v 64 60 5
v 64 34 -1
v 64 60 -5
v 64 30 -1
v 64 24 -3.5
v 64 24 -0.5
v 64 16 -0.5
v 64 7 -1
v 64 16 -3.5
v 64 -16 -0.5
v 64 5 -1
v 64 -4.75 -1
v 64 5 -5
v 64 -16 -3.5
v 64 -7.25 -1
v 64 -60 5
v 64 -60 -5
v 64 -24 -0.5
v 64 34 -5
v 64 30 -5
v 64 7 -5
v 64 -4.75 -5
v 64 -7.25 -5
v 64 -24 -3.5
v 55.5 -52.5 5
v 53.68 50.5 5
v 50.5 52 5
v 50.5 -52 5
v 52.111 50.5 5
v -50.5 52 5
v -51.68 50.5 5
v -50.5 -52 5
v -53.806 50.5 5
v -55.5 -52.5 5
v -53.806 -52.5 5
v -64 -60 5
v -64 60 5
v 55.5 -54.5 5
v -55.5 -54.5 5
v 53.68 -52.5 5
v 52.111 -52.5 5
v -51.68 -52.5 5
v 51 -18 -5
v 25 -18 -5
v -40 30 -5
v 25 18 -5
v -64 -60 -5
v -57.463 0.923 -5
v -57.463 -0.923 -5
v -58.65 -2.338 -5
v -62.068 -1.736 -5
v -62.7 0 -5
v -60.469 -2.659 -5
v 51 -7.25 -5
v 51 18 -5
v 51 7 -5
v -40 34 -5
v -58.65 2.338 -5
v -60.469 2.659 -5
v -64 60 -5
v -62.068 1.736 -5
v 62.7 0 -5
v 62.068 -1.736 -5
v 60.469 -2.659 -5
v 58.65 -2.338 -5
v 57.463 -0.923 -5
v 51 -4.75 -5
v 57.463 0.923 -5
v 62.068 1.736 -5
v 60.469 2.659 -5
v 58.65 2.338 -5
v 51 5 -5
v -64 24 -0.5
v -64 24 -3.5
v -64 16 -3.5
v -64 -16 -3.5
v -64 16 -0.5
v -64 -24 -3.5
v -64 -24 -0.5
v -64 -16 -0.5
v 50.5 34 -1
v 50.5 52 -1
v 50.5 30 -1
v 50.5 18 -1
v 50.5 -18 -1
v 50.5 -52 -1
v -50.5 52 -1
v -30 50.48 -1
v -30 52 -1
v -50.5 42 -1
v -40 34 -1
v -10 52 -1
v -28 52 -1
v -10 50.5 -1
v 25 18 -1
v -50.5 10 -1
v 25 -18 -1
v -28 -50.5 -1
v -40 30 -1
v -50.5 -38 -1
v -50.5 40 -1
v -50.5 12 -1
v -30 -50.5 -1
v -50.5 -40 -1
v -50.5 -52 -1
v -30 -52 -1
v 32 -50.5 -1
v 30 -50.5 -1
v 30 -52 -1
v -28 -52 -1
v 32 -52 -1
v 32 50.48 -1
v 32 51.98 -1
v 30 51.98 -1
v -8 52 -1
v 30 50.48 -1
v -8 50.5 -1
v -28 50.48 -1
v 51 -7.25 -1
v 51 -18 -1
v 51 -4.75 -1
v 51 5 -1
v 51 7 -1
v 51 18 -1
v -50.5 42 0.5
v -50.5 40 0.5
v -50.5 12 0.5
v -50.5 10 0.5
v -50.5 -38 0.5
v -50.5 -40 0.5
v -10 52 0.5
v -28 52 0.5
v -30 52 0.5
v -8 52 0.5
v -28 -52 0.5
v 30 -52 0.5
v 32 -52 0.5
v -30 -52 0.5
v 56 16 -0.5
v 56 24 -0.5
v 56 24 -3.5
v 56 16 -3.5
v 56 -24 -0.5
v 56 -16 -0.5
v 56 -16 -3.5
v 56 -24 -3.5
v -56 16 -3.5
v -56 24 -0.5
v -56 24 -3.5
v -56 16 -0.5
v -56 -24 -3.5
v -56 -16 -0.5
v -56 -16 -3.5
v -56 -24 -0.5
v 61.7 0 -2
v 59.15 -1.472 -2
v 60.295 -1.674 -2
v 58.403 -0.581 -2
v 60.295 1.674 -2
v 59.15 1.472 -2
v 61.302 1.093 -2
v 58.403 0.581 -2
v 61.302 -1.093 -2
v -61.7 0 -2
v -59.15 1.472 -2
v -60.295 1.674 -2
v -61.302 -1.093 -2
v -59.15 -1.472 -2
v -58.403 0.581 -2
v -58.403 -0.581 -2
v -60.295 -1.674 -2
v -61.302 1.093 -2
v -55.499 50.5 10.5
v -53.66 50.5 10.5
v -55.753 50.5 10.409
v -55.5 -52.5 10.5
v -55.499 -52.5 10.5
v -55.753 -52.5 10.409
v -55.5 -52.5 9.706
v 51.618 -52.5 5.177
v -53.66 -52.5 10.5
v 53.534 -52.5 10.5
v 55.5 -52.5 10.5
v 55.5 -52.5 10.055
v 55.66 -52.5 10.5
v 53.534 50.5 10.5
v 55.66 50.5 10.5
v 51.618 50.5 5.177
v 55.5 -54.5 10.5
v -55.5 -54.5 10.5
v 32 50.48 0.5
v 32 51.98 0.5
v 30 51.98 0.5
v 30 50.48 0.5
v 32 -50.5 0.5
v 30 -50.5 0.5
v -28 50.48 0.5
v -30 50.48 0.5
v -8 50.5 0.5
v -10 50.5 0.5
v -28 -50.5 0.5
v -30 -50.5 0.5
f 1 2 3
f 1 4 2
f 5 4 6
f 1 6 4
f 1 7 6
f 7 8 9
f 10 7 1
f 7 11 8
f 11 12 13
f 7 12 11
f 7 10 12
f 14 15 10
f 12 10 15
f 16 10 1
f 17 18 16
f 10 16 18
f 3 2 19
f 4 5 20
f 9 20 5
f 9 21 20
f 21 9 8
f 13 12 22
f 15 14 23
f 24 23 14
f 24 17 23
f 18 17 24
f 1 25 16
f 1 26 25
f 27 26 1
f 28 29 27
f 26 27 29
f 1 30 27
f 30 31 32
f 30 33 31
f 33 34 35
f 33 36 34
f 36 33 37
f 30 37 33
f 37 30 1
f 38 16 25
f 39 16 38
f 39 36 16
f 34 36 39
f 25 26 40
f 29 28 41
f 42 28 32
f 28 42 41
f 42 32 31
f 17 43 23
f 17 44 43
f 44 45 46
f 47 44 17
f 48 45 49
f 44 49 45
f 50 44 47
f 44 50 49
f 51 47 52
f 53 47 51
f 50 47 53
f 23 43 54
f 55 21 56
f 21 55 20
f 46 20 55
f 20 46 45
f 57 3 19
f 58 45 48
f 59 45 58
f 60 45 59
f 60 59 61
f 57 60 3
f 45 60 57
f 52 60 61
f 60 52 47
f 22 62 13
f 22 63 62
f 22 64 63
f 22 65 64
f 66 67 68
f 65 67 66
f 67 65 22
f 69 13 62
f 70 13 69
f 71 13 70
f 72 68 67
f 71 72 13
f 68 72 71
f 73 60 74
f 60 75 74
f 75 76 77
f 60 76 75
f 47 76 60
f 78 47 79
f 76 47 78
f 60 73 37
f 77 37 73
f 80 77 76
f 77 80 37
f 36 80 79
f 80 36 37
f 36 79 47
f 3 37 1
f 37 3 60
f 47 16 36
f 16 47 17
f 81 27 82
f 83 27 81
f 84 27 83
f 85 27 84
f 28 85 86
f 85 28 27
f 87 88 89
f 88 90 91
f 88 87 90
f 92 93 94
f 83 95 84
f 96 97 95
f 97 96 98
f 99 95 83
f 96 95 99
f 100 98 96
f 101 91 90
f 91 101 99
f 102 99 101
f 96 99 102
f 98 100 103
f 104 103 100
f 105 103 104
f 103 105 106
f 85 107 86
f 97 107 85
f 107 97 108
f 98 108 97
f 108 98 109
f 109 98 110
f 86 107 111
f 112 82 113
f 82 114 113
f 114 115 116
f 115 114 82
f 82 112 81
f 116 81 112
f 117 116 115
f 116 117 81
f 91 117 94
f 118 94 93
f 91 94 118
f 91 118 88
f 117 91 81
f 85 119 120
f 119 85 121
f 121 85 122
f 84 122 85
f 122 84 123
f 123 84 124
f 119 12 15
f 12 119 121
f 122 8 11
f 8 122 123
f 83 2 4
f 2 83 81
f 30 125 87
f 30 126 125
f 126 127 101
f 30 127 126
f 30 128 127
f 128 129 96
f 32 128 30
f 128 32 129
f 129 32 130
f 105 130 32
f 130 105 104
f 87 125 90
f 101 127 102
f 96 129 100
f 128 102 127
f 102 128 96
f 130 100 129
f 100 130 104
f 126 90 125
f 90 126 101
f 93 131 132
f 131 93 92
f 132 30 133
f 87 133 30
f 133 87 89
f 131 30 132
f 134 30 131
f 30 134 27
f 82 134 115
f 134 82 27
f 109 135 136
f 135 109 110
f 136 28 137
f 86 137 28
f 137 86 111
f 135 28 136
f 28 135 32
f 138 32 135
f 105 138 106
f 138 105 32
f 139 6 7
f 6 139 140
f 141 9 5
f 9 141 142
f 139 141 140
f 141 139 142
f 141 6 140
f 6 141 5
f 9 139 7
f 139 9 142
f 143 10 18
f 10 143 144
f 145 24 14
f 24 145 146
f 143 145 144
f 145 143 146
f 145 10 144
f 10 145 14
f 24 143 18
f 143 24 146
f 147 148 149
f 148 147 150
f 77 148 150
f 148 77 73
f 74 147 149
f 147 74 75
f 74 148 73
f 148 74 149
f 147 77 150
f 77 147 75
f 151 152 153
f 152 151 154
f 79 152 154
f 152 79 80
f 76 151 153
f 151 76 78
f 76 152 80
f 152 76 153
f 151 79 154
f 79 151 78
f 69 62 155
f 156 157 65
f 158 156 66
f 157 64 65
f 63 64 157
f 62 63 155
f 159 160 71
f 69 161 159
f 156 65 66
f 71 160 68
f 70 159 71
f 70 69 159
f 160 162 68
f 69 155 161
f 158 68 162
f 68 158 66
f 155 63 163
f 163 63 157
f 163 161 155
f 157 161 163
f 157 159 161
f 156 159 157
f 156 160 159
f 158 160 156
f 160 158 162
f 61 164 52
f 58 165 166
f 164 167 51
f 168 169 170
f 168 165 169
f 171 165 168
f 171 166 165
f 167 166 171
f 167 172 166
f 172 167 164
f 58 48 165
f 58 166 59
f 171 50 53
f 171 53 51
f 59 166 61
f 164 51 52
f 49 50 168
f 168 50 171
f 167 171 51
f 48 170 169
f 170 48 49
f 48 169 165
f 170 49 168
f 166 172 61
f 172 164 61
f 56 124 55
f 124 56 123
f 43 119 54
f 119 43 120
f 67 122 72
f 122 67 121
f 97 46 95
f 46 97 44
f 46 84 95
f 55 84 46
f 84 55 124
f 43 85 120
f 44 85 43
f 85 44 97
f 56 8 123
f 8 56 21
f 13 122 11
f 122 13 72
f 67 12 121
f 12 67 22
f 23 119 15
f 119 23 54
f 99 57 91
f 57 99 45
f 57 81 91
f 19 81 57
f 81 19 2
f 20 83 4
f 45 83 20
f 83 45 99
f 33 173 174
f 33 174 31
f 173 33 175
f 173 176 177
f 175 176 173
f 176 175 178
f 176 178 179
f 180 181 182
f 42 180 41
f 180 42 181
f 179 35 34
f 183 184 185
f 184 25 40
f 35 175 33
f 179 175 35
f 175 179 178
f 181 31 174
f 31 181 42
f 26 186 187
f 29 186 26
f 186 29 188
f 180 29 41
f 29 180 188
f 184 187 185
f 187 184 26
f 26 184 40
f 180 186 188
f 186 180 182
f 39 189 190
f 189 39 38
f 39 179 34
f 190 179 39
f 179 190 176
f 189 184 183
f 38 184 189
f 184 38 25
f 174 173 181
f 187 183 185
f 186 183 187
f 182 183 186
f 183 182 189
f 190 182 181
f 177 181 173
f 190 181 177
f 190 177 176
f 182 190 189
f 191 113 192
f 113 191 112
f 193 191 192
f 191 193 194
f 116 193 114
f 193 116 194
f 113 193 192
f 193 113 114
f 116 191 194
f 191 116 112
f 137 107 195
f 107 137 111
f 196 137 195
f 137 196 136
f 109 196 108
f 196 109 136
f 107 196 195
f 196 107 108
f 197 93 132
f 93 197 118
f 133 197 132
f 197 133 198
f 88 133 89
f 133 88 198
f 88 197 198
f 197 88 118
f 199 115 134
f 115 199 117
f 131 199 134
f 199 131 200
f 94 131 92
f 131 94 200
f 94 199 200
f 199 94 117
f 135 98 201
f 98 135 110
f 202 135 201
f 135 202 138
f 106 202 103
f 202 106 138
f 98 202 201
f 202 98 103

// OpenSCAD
// file: frame.scad
rahmen();

module rahmen() {
difference()  {
union() {
rotate([-19.8, 0, 0]) cube([103, 2, 7]);
translate([0, -105, 0]) rotate([19.8, 0, 0]) cube([103, 2, 7]);
translate([-2, -107, 0]) cube([2, 111, 7]);
}
translate([-2, -110, -1]) cube([120, 120, 1.5]);
translate([-2, -110, 6]) cube([120, 120, 1.5]);
}
}
// main file
use <frame.scad>

x=128;
y=120;
h=10;
platte_x=101;
platte_x_50=104;
platte_y=104;
platte_y_50=51;

//plate_holder();
plate_holder_tower_frame();

module plate_holder() {
difference() {
cube([x, y, h], center=true);
    translate([0, 0, 0])
cube([platte_x, platte_y, h-2], center=true);
    translate([0, 0, 6])
cube([platte_x+15, platte_y+15, h-5], center=true);
//chambers for magnets
    translate([60, 20, -2])
    cube([8, 8, 3], center=true);
    translate([60, -20, -2])
    cube([8, 8, 3], center=true);
    translate([-60, 20, -2])
    cube([8, 8, 3], center=true);
    translate([-60, -20, -2])
    cube([8, 8, 3], center=true);
// position hole
   translate([60, 0, -5]) 
   cylinder(d1=5.4, d2=3.4, h=3);
   mirror([1,0,0]) translate([60, 0, -5]) 
   cylinder(d1=5.4, d2=3.4, h=3);
//heating foil cables
   translate([38, 0,-3])
   cube([26, 36, 4], center=true);
   translate([50, 6, -3])
   cube([30, 2, 4], center=true);
   translate([50, -6, -3])
   cube([30, 2.5, 4], center=true);
//thermistor
    translate([-40, 30, -5])
    cube([110, 4, 4]);
}
//plate spacer
translate([30, platte_y/2-1.52, -4]) cube([2, 1.5, 4.5]);
translate([30, -platte_y/2, -4]) cube([2, 1.5, 4.5]);
translate([-30, platte_y/2-1.52, -4]) cube([2, 1.5, 4.5]);
translate([-30, platte_y/2-1.5, -4]) cube([2, 1.5, 4.5]);
translate([-10, platte_y/2-1.5, -4]) cube([2, 1.5, 4.5]);
translate([-51.5, 40, -4]) cube([1, 2, 4.5]);
translate([-51.5, 10, -4]) cube([1, 2, 4.5]);
translate([-51.5, -40, -4]) cube([1, 2, 4.5]);
translate([-30, -platte_y/2, -4]) cube([2, 1.5, 4.5]);
}

module plate_holder_tower_frame() {
difference() {
cube([x, y, h], center=true);
translate([0, 0, 2]) cube([platte_x, platte_y, h-4], center=true);
//chambers for magnets
    translate([60, 20, -2])
    cube([8, 8, 3], center=true);
    translate([60, -20, -2])
    cube([8, 8, 3], center=true);
    translate([-60, 20, -2])
    cube([8, 8, 3], center=true);
    translate([-60, -20, -2])
    cube([8, 8, 3], center=true);
// position hole
   translate([60, 0, -5]) 
   cylinder(d1=5.4, d2=3.4, h=3);
   mirror([1,0,0]) translate([60, 0, -5]) 
   cylinder(d1=5.4, d2=3.4, h=3);
//heating foil cables
   translate([38, 0,-3])
   cube([26, 36, 4], center=true);
   translate([50, 6, -3])
   cube([30, 2, 4], center=true);
   translate([50, -6, -3])
   cube([30, 2.5, 4], center=true);
//thermistor
   translate([-40, 30, -5])
   cube([110, 4, 4]);
}
//plate spacer
translate([30, platte_y/2-1.52, -4]) cube([2, 1.5, 4.5]);
translate([30, -platte_y/2, -4]) cube([2, 1.5, 4.5]);
translate([-30, platte_y/2-1.52, -4]) cube([2, 1.5, 4.5]);
translate([-30, platte_y/2-1.5, -4]) cube([2, 1.5, 4.5]);
translate([-10, platte_y/2-1.5, -4]) cube([2, 1.5, 4.5]);
translate([-51.5, 40, -4]) cube([1, 2, 4.5]);
translate([-51.5, 10, -4]) cube([1, 2, 4.5]);
translate([-51.5, -40, -4]) cube([1, 2, 4.5]);
translate([-30, -platte_y/2, -4]) cube([2, 1.5, 4.5]);
//tower frame on plate holder
rotate([0, 0, 90]) translate([-platte_y/2+1.5-2, 50.5+1, 4.5]) rahmen();
}
